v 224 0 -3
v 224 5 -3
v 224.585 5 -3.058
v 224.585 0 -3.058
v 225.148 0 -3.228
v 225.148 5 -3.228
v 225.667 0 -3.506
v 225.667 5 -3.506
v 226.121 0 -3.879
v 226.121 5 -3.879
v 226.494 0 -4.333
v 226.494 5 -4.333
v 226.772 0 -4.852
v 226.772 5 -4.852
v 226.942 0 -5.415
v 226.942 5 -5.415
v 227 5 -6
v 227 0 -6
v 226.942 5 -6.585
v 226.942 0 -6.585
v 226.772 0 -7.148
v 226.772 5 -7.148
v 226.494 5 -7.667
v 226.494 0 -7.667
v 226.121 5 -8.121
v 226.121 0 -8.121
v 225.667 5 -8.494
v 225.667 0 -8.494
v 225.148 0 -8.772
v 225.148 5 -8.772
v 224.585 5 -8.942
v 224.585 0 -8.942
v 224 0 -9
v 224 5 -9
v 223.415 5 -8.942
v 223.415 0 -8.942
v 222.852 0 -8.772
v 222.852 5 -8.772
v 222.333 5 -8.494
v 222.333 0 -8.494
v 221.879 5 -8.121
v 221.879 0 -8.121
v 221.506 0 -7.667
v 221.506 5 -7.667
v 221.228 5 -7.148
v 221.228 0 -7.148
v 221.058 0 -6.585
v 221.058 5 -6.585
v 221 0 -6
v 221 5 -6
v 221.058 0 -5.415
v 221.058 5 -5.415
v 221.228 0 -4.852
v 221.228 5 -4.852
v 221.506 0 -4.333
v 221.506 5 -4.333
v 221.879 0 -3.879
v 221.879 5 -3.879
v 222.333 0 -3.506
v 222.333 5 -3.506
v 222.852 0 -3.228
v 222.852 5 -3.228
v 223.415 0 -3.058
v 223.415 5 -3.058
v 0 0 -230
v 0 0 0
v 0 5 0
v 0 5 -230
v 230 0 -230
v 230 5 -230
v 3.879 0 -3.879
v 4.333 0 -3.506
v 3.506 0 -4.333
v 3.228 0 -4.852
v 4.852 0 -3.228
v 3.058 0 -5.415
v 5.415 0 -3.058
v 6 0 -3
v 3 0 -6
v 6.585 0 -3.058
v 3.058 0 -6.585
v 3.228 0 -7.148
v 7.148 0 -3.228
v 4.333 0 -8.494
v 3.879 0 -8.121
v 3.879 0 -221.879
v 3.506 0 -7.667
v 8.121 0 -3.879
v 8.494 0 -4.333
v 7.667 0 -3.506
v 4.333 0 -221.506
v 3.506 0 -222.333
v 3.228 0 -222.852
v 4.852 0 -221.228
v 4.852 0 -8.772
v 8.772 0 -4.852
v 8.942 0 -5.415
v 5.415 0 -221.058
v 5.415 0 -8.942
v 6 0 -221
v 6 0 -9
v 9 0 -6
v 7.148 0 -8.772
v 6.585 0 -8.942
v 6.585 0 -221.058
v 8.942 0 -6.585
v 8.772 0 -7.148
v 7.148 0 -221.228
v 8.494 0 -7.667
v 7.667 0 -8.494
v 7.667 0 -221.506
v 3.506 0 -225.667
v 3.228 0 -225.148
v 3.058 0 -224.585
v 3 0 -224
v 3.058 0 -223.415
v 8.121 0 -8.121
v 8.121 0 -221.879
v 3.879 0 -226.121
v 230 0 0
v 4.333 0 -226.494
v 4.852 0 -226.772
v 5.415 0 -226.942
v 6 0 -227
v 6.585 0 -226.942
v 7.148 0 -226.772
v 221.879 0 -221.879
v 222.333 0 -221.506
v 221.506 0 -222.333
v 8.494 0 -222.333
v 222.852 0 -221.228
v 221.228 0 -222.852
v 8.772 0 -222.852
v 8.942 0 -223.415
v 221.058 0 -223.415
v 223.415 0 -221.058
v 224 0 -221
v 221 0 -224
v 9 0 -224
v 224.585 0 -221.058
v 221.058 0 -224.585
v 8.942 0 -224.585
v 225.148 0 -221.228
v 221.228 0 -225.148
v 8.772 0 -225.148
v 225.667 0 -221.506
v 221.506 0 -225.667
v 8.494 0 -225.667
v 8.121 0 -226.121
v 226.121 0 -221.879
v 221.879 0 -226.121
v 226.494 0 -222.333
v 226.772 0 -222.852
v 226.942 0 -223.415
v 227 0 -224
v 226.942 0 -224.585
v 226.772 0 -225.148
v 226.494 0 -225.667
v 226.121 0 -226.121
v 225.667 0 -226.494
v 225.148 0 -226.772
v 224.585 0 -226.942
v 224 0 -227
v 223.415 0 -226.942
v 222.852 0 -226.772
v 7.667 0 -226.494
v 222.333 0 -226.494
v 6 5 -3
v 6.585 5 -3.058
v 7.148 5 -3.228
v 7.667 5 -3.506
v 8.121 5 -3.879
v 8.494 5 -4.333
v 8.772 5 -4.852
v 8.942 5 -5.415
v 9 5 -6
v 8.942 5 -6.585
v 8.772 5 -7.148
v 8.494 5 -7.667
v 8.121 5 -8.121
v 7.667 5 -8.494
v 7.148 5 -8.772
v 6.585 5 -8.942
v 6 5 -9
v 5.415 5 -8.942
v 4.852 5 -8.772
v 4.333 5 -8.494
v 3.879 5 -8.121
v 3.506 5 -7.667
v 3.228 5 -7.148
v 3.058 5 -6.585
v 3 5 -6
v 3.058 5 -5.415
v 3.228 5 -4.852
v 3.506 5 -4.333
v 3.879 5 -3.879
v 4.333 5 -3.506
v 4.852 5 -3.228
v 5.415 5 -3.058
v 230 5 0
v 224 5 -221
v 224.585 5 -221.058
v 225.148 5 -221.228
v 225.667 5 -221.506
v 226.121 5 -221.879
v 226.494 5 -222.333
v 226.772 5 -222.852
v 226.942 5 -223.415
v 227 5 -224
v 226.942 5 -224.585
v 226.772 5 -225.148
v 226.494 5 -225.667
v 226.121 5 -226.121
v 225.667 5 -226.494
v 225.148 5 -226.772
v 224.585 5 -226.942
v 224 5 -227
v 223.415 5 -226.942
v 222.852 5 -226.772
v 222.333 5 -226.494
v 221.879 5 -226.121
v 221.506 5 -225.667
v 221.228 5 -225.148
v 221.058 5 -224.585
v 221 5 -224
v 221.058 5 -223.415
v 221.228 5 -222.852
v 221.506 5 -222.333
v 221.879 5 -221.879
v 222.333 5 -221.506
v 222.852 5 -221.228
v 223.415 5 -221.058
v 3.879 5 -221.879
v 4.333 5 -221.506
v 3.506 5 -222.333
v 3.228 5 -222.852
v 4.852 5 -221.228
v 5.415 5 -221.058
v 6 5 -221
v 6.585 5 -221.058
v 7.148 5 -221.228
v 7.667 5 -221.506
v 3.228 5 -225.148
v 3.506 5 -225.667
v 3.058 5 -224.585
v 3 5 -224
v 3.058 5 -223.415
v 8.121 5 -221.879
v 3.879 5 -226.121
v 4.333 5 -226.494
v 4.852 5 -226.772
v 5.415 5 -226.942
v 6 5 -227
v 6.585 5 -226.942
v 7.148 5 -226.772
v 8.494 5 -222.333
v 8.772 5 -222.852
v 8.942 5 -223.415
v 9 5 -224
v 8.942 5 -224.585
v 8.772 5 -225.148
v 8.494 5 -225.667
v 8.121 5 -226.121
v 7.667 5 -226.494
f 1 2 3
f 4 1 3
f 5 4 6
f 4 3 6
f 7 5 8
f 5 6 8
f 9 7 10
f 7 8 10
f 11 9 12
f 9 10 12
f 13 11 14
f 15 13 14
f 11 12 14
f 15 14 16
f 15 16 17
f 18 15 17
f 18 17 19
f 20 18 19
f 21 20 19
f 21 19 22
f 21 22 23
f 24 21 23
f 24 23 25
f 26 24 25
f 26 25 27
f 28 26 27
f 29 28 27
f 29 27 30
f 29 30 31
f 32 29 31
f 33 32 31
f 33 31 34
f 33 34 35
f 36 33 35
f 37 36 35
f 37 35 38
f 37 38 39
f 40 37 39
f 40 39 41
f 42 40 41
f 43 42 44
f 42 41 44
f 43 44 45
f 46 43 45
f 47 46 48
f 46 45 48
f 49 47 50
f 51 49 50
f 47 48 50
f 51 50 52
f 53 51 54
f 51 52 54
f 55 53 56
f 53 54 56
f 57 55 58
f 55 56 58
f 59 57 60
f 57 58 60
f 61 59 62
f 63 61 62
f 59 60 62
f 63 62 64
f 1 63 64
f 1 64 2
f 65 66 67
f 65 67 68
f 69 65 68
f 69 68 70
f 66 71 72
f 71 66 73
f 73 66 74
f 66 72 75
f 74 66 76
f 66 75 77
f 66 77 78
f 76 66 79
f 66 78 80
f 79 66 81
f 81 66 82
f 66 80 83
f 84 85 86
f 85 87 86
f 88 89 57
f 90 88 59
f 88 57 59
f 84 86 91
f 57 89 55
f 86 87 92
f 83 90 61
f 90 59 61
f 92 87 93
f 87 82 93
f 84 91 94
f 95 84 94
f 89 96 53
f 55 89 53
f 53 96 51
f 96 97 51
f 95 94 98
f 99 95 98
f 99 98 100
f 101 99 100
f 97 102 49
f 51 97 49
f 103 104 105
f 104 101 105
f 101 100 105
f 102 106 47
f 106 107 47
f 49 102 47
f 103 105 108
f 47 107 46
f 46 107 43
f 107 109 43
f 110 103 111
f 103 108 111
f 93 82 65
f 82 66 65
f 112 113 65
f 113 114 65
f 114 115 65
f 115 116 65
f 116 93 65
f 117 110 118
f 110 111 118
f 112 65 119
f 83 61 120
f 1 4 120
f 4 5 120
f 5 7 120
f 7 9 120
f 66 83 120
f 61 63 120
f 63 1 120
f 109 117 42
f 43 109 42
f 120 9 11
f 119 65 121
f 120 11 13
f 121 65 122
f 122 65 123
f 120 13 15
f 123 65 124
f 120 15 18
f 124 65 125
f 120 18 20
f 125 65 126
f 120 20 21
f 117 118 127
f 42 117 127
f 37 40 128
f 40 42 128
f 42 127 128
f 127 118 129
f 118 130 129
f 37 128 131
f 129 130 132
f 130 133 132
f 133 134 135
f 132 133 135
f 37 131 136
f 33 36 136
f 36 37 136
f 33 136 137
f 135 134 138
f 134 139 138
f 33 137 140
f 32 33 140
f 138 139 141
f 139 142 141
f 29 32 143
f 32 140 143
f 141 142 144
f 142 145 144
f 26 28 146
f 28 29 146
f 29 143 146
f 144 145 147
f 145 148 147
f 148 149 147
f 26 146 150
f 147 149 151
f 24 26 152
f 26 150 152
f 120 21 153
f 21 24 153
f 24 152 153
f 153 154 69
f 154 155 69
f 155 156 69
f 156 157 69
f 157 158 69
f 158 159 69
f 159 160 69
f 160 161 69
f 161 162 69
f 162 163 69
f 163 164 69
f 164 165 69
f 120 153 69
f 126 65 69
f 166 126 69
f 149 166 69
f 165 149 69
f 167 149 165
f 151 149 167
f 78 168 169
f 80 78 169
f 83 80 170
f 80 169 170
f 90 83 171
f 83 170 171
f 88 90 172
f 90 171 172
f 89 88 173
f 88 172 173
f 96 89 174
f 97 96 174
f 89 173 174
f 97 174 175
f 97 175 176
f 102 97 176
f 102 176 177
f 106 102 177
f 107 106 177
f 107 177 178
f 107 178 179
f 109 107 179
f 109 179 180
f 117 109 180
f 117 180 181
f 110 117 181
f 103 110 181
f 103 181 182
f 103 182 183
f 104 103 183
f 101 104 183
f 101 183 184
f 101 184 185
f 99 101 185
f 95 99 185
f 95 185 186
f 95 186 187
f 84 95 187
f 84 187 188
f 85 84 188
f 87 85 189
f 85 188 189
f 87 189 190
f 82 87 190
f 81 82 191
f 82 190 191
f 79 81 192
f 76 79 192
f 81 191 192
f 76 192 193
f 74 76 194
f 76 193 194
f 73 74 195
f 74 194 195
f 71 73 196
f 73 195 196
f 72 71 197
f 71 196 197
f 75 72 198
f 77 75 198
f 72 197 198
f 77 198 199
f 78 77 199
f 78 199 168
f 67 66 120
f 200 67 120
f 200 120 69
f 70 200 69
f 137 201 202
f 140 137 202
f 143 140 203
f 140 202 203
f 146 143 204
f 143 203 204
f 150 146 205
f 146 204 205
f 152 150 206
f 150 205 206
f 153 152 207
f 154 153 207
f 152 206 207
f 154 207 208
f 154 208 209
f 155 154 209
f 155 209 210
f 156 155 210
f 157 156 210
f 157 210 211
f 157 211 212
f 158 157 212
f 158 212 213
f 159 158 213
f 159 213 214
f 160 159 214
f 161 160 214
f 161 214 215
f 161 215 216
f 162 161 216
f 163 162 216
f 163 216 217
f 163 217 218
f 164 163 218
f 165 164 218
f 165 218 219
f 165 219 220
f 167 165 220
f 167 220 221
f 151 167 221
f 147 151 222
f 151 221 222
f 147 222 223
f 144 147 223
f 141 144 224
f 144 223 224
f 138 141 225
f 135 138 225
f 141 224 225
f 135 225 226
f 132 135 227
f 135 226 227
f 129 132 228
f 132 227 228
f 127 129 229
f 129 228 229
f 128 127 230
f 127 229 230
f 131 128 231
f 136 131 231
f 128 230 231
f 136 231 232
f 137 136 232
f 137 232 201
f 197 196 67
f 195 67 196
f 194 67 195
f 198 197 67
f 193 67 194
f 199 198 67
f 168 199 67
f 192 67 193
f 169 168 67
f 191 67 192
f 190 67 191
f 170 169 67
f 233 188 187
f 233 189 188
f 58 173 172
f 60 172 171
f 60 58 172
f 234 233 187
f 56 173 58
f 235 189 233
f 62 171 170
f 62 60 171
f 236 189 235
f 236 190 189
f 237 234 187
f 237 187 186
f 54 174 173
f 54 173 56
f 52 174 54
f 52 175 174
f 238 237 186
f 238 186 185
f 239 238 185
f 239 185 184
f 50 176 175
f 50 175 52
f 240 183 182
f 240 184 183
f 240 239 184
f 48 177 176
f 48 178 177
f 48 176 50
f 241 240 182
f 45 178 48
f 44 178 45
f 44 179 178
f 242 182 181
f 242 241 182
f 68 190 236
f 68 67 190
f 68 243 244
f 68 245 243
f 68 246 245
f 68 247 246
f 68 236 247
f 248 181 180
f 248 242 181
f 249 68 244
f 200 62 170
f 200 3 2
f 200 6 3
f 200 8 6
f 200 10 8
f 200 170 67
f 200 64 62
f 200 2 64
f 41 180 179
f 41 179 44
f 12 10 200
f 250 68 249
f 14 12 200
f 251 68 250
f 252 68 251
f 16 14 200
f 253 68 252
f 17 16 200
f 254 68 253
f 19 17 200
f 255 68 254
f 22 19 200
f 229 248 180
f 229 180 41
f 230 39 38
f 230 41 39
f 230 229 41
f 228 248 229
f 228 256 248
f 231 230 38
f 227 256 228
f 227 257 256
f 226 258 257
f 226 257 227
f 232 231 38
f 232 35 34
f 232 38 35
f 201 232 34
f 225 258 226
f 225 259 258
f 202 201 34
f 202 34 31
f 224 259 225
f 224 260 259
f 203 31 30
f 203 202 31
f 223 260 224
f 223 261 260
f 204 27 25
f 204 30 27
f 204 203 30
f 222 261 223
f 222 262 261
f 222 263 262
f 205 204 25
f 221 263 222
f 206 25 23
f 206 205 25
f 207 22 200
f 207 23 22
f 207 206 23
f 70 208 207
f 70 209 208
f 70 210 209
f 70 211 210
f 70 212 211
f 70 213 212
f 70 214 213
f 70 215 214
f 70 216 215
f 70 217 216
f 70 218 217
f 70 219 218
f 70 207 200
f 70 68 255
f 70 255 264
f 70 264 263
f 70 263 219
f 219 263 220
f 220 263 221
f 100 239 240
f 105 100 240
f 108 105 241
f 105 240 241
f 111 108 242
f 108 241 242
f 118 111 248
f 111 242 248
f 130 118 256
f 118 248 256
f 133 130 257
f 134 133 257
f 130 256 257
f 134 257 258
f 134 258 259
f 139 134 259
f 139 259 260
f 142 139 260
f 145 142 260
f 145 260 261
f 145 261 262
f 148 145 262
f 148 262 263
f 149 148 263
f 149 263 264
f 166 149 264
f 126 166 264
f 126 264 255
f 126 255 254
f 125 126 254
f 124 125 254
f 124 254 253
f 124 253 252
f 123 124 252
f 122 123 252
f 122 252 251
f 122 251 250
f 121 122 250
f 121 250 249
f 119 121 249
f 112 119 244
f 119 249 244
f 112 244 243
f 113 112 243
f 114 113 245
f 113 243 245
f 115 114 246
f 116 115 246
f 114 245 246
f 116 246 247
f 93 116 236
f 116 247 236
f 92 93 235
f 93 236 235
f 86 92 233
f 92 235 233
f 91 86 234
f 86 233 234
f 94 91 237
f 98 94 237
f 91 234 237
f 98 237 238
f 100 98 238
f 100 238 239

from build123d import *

# Parameters (mm, degrees)
SKETCH2_W           = 230
SKETCH2_H           = 230
BOSS_EXTRUDE1_DEPTH = 5
SKETCH3_R           = 3
CUT_EXTRUDE1_DEPTH  = 326.307546792
SKETCH4_R           = 3
CUT_EXTRUDE2_DEPTH  = 326.307546792
SKETCH5_R           = 3
CUT_EXTRUDE3_DEPTH  = 326.307546792
SKETCH6_R           = 3
CUT_EXTRUDE4_DEPTH  = 326.307546792


with BuildPart() as part:
    # Sketch2 → Boss-Extrude1 (new body)
    with BuildSketch(Plane(origin=(0, 0, 0), x_dir=(1, 0, 0), z_dir=(0, 1, 0))):
        with Locations((115, 115)):
            Rectangle(SKETCH2_W, SKETCH2_H)
    extrude(amount=BOSS_EXTRUDE1_DEPTH)

    # Sketch3 → Cut-Extrude1 (cut, through all)
    with BuildSketch(Plane(origin=(0, 5, 0), x_dir=(1, 0, 0), z_dir=(0, 1, 0))):
        with Locations(Location((6, 224, 0), (0, 0, 270))):
            Circle(SKETCH3_R)
    extrude(amount=-CUT_EXTRUDE1_DEPTH, mode=Mode.SUBTRACT)

    # Sketch4 → Cut-Extrude2 (cut, through all)
    with BuildSketch(Plane(origin=(0, 5, 0), x_dir=(1, 0, 0), z_dir=(0, 1, 0))):
        with Locations(Location((224, 224, 0), (0, 0, 270))):
            Circle(SKETCH4_R)
    extrude(amount=-CUT_EXTRUDE2_DEPTH, mode=Mode.SUBTRACT)

    # Sketch5 → Cut-Extrude3 (cut, through all)
    with BuildSketch(Plane(origin=(0, 5, 0), x_dir=(1, 0, 0), z_dir=(0, 1, 0))):
        with Locations(Location((6, 6, 0), (0, 0, 270))):
            Circle(SKETCH5_R)
    extrude(amount=-CUT_EXTRUDE3_DEPTH, mode=Mode.SUBTRACT)

    # Sketch6 → Cut-Extrude4 (cut, through all)
    with BuildSketch(Plane(origin=(0, 5, 0), x_dir=(1, 0, 0), z_dir=(0, 1, 0))):
        with Locations(Location((224, 6, 0), (0, 0, 270))):
            Circle(SKETCH6_R)
    extrude(amount=-CUT_EXTRUDE4_DEPTH, mode=Mode.SUBTRACT)


solid = part.part
